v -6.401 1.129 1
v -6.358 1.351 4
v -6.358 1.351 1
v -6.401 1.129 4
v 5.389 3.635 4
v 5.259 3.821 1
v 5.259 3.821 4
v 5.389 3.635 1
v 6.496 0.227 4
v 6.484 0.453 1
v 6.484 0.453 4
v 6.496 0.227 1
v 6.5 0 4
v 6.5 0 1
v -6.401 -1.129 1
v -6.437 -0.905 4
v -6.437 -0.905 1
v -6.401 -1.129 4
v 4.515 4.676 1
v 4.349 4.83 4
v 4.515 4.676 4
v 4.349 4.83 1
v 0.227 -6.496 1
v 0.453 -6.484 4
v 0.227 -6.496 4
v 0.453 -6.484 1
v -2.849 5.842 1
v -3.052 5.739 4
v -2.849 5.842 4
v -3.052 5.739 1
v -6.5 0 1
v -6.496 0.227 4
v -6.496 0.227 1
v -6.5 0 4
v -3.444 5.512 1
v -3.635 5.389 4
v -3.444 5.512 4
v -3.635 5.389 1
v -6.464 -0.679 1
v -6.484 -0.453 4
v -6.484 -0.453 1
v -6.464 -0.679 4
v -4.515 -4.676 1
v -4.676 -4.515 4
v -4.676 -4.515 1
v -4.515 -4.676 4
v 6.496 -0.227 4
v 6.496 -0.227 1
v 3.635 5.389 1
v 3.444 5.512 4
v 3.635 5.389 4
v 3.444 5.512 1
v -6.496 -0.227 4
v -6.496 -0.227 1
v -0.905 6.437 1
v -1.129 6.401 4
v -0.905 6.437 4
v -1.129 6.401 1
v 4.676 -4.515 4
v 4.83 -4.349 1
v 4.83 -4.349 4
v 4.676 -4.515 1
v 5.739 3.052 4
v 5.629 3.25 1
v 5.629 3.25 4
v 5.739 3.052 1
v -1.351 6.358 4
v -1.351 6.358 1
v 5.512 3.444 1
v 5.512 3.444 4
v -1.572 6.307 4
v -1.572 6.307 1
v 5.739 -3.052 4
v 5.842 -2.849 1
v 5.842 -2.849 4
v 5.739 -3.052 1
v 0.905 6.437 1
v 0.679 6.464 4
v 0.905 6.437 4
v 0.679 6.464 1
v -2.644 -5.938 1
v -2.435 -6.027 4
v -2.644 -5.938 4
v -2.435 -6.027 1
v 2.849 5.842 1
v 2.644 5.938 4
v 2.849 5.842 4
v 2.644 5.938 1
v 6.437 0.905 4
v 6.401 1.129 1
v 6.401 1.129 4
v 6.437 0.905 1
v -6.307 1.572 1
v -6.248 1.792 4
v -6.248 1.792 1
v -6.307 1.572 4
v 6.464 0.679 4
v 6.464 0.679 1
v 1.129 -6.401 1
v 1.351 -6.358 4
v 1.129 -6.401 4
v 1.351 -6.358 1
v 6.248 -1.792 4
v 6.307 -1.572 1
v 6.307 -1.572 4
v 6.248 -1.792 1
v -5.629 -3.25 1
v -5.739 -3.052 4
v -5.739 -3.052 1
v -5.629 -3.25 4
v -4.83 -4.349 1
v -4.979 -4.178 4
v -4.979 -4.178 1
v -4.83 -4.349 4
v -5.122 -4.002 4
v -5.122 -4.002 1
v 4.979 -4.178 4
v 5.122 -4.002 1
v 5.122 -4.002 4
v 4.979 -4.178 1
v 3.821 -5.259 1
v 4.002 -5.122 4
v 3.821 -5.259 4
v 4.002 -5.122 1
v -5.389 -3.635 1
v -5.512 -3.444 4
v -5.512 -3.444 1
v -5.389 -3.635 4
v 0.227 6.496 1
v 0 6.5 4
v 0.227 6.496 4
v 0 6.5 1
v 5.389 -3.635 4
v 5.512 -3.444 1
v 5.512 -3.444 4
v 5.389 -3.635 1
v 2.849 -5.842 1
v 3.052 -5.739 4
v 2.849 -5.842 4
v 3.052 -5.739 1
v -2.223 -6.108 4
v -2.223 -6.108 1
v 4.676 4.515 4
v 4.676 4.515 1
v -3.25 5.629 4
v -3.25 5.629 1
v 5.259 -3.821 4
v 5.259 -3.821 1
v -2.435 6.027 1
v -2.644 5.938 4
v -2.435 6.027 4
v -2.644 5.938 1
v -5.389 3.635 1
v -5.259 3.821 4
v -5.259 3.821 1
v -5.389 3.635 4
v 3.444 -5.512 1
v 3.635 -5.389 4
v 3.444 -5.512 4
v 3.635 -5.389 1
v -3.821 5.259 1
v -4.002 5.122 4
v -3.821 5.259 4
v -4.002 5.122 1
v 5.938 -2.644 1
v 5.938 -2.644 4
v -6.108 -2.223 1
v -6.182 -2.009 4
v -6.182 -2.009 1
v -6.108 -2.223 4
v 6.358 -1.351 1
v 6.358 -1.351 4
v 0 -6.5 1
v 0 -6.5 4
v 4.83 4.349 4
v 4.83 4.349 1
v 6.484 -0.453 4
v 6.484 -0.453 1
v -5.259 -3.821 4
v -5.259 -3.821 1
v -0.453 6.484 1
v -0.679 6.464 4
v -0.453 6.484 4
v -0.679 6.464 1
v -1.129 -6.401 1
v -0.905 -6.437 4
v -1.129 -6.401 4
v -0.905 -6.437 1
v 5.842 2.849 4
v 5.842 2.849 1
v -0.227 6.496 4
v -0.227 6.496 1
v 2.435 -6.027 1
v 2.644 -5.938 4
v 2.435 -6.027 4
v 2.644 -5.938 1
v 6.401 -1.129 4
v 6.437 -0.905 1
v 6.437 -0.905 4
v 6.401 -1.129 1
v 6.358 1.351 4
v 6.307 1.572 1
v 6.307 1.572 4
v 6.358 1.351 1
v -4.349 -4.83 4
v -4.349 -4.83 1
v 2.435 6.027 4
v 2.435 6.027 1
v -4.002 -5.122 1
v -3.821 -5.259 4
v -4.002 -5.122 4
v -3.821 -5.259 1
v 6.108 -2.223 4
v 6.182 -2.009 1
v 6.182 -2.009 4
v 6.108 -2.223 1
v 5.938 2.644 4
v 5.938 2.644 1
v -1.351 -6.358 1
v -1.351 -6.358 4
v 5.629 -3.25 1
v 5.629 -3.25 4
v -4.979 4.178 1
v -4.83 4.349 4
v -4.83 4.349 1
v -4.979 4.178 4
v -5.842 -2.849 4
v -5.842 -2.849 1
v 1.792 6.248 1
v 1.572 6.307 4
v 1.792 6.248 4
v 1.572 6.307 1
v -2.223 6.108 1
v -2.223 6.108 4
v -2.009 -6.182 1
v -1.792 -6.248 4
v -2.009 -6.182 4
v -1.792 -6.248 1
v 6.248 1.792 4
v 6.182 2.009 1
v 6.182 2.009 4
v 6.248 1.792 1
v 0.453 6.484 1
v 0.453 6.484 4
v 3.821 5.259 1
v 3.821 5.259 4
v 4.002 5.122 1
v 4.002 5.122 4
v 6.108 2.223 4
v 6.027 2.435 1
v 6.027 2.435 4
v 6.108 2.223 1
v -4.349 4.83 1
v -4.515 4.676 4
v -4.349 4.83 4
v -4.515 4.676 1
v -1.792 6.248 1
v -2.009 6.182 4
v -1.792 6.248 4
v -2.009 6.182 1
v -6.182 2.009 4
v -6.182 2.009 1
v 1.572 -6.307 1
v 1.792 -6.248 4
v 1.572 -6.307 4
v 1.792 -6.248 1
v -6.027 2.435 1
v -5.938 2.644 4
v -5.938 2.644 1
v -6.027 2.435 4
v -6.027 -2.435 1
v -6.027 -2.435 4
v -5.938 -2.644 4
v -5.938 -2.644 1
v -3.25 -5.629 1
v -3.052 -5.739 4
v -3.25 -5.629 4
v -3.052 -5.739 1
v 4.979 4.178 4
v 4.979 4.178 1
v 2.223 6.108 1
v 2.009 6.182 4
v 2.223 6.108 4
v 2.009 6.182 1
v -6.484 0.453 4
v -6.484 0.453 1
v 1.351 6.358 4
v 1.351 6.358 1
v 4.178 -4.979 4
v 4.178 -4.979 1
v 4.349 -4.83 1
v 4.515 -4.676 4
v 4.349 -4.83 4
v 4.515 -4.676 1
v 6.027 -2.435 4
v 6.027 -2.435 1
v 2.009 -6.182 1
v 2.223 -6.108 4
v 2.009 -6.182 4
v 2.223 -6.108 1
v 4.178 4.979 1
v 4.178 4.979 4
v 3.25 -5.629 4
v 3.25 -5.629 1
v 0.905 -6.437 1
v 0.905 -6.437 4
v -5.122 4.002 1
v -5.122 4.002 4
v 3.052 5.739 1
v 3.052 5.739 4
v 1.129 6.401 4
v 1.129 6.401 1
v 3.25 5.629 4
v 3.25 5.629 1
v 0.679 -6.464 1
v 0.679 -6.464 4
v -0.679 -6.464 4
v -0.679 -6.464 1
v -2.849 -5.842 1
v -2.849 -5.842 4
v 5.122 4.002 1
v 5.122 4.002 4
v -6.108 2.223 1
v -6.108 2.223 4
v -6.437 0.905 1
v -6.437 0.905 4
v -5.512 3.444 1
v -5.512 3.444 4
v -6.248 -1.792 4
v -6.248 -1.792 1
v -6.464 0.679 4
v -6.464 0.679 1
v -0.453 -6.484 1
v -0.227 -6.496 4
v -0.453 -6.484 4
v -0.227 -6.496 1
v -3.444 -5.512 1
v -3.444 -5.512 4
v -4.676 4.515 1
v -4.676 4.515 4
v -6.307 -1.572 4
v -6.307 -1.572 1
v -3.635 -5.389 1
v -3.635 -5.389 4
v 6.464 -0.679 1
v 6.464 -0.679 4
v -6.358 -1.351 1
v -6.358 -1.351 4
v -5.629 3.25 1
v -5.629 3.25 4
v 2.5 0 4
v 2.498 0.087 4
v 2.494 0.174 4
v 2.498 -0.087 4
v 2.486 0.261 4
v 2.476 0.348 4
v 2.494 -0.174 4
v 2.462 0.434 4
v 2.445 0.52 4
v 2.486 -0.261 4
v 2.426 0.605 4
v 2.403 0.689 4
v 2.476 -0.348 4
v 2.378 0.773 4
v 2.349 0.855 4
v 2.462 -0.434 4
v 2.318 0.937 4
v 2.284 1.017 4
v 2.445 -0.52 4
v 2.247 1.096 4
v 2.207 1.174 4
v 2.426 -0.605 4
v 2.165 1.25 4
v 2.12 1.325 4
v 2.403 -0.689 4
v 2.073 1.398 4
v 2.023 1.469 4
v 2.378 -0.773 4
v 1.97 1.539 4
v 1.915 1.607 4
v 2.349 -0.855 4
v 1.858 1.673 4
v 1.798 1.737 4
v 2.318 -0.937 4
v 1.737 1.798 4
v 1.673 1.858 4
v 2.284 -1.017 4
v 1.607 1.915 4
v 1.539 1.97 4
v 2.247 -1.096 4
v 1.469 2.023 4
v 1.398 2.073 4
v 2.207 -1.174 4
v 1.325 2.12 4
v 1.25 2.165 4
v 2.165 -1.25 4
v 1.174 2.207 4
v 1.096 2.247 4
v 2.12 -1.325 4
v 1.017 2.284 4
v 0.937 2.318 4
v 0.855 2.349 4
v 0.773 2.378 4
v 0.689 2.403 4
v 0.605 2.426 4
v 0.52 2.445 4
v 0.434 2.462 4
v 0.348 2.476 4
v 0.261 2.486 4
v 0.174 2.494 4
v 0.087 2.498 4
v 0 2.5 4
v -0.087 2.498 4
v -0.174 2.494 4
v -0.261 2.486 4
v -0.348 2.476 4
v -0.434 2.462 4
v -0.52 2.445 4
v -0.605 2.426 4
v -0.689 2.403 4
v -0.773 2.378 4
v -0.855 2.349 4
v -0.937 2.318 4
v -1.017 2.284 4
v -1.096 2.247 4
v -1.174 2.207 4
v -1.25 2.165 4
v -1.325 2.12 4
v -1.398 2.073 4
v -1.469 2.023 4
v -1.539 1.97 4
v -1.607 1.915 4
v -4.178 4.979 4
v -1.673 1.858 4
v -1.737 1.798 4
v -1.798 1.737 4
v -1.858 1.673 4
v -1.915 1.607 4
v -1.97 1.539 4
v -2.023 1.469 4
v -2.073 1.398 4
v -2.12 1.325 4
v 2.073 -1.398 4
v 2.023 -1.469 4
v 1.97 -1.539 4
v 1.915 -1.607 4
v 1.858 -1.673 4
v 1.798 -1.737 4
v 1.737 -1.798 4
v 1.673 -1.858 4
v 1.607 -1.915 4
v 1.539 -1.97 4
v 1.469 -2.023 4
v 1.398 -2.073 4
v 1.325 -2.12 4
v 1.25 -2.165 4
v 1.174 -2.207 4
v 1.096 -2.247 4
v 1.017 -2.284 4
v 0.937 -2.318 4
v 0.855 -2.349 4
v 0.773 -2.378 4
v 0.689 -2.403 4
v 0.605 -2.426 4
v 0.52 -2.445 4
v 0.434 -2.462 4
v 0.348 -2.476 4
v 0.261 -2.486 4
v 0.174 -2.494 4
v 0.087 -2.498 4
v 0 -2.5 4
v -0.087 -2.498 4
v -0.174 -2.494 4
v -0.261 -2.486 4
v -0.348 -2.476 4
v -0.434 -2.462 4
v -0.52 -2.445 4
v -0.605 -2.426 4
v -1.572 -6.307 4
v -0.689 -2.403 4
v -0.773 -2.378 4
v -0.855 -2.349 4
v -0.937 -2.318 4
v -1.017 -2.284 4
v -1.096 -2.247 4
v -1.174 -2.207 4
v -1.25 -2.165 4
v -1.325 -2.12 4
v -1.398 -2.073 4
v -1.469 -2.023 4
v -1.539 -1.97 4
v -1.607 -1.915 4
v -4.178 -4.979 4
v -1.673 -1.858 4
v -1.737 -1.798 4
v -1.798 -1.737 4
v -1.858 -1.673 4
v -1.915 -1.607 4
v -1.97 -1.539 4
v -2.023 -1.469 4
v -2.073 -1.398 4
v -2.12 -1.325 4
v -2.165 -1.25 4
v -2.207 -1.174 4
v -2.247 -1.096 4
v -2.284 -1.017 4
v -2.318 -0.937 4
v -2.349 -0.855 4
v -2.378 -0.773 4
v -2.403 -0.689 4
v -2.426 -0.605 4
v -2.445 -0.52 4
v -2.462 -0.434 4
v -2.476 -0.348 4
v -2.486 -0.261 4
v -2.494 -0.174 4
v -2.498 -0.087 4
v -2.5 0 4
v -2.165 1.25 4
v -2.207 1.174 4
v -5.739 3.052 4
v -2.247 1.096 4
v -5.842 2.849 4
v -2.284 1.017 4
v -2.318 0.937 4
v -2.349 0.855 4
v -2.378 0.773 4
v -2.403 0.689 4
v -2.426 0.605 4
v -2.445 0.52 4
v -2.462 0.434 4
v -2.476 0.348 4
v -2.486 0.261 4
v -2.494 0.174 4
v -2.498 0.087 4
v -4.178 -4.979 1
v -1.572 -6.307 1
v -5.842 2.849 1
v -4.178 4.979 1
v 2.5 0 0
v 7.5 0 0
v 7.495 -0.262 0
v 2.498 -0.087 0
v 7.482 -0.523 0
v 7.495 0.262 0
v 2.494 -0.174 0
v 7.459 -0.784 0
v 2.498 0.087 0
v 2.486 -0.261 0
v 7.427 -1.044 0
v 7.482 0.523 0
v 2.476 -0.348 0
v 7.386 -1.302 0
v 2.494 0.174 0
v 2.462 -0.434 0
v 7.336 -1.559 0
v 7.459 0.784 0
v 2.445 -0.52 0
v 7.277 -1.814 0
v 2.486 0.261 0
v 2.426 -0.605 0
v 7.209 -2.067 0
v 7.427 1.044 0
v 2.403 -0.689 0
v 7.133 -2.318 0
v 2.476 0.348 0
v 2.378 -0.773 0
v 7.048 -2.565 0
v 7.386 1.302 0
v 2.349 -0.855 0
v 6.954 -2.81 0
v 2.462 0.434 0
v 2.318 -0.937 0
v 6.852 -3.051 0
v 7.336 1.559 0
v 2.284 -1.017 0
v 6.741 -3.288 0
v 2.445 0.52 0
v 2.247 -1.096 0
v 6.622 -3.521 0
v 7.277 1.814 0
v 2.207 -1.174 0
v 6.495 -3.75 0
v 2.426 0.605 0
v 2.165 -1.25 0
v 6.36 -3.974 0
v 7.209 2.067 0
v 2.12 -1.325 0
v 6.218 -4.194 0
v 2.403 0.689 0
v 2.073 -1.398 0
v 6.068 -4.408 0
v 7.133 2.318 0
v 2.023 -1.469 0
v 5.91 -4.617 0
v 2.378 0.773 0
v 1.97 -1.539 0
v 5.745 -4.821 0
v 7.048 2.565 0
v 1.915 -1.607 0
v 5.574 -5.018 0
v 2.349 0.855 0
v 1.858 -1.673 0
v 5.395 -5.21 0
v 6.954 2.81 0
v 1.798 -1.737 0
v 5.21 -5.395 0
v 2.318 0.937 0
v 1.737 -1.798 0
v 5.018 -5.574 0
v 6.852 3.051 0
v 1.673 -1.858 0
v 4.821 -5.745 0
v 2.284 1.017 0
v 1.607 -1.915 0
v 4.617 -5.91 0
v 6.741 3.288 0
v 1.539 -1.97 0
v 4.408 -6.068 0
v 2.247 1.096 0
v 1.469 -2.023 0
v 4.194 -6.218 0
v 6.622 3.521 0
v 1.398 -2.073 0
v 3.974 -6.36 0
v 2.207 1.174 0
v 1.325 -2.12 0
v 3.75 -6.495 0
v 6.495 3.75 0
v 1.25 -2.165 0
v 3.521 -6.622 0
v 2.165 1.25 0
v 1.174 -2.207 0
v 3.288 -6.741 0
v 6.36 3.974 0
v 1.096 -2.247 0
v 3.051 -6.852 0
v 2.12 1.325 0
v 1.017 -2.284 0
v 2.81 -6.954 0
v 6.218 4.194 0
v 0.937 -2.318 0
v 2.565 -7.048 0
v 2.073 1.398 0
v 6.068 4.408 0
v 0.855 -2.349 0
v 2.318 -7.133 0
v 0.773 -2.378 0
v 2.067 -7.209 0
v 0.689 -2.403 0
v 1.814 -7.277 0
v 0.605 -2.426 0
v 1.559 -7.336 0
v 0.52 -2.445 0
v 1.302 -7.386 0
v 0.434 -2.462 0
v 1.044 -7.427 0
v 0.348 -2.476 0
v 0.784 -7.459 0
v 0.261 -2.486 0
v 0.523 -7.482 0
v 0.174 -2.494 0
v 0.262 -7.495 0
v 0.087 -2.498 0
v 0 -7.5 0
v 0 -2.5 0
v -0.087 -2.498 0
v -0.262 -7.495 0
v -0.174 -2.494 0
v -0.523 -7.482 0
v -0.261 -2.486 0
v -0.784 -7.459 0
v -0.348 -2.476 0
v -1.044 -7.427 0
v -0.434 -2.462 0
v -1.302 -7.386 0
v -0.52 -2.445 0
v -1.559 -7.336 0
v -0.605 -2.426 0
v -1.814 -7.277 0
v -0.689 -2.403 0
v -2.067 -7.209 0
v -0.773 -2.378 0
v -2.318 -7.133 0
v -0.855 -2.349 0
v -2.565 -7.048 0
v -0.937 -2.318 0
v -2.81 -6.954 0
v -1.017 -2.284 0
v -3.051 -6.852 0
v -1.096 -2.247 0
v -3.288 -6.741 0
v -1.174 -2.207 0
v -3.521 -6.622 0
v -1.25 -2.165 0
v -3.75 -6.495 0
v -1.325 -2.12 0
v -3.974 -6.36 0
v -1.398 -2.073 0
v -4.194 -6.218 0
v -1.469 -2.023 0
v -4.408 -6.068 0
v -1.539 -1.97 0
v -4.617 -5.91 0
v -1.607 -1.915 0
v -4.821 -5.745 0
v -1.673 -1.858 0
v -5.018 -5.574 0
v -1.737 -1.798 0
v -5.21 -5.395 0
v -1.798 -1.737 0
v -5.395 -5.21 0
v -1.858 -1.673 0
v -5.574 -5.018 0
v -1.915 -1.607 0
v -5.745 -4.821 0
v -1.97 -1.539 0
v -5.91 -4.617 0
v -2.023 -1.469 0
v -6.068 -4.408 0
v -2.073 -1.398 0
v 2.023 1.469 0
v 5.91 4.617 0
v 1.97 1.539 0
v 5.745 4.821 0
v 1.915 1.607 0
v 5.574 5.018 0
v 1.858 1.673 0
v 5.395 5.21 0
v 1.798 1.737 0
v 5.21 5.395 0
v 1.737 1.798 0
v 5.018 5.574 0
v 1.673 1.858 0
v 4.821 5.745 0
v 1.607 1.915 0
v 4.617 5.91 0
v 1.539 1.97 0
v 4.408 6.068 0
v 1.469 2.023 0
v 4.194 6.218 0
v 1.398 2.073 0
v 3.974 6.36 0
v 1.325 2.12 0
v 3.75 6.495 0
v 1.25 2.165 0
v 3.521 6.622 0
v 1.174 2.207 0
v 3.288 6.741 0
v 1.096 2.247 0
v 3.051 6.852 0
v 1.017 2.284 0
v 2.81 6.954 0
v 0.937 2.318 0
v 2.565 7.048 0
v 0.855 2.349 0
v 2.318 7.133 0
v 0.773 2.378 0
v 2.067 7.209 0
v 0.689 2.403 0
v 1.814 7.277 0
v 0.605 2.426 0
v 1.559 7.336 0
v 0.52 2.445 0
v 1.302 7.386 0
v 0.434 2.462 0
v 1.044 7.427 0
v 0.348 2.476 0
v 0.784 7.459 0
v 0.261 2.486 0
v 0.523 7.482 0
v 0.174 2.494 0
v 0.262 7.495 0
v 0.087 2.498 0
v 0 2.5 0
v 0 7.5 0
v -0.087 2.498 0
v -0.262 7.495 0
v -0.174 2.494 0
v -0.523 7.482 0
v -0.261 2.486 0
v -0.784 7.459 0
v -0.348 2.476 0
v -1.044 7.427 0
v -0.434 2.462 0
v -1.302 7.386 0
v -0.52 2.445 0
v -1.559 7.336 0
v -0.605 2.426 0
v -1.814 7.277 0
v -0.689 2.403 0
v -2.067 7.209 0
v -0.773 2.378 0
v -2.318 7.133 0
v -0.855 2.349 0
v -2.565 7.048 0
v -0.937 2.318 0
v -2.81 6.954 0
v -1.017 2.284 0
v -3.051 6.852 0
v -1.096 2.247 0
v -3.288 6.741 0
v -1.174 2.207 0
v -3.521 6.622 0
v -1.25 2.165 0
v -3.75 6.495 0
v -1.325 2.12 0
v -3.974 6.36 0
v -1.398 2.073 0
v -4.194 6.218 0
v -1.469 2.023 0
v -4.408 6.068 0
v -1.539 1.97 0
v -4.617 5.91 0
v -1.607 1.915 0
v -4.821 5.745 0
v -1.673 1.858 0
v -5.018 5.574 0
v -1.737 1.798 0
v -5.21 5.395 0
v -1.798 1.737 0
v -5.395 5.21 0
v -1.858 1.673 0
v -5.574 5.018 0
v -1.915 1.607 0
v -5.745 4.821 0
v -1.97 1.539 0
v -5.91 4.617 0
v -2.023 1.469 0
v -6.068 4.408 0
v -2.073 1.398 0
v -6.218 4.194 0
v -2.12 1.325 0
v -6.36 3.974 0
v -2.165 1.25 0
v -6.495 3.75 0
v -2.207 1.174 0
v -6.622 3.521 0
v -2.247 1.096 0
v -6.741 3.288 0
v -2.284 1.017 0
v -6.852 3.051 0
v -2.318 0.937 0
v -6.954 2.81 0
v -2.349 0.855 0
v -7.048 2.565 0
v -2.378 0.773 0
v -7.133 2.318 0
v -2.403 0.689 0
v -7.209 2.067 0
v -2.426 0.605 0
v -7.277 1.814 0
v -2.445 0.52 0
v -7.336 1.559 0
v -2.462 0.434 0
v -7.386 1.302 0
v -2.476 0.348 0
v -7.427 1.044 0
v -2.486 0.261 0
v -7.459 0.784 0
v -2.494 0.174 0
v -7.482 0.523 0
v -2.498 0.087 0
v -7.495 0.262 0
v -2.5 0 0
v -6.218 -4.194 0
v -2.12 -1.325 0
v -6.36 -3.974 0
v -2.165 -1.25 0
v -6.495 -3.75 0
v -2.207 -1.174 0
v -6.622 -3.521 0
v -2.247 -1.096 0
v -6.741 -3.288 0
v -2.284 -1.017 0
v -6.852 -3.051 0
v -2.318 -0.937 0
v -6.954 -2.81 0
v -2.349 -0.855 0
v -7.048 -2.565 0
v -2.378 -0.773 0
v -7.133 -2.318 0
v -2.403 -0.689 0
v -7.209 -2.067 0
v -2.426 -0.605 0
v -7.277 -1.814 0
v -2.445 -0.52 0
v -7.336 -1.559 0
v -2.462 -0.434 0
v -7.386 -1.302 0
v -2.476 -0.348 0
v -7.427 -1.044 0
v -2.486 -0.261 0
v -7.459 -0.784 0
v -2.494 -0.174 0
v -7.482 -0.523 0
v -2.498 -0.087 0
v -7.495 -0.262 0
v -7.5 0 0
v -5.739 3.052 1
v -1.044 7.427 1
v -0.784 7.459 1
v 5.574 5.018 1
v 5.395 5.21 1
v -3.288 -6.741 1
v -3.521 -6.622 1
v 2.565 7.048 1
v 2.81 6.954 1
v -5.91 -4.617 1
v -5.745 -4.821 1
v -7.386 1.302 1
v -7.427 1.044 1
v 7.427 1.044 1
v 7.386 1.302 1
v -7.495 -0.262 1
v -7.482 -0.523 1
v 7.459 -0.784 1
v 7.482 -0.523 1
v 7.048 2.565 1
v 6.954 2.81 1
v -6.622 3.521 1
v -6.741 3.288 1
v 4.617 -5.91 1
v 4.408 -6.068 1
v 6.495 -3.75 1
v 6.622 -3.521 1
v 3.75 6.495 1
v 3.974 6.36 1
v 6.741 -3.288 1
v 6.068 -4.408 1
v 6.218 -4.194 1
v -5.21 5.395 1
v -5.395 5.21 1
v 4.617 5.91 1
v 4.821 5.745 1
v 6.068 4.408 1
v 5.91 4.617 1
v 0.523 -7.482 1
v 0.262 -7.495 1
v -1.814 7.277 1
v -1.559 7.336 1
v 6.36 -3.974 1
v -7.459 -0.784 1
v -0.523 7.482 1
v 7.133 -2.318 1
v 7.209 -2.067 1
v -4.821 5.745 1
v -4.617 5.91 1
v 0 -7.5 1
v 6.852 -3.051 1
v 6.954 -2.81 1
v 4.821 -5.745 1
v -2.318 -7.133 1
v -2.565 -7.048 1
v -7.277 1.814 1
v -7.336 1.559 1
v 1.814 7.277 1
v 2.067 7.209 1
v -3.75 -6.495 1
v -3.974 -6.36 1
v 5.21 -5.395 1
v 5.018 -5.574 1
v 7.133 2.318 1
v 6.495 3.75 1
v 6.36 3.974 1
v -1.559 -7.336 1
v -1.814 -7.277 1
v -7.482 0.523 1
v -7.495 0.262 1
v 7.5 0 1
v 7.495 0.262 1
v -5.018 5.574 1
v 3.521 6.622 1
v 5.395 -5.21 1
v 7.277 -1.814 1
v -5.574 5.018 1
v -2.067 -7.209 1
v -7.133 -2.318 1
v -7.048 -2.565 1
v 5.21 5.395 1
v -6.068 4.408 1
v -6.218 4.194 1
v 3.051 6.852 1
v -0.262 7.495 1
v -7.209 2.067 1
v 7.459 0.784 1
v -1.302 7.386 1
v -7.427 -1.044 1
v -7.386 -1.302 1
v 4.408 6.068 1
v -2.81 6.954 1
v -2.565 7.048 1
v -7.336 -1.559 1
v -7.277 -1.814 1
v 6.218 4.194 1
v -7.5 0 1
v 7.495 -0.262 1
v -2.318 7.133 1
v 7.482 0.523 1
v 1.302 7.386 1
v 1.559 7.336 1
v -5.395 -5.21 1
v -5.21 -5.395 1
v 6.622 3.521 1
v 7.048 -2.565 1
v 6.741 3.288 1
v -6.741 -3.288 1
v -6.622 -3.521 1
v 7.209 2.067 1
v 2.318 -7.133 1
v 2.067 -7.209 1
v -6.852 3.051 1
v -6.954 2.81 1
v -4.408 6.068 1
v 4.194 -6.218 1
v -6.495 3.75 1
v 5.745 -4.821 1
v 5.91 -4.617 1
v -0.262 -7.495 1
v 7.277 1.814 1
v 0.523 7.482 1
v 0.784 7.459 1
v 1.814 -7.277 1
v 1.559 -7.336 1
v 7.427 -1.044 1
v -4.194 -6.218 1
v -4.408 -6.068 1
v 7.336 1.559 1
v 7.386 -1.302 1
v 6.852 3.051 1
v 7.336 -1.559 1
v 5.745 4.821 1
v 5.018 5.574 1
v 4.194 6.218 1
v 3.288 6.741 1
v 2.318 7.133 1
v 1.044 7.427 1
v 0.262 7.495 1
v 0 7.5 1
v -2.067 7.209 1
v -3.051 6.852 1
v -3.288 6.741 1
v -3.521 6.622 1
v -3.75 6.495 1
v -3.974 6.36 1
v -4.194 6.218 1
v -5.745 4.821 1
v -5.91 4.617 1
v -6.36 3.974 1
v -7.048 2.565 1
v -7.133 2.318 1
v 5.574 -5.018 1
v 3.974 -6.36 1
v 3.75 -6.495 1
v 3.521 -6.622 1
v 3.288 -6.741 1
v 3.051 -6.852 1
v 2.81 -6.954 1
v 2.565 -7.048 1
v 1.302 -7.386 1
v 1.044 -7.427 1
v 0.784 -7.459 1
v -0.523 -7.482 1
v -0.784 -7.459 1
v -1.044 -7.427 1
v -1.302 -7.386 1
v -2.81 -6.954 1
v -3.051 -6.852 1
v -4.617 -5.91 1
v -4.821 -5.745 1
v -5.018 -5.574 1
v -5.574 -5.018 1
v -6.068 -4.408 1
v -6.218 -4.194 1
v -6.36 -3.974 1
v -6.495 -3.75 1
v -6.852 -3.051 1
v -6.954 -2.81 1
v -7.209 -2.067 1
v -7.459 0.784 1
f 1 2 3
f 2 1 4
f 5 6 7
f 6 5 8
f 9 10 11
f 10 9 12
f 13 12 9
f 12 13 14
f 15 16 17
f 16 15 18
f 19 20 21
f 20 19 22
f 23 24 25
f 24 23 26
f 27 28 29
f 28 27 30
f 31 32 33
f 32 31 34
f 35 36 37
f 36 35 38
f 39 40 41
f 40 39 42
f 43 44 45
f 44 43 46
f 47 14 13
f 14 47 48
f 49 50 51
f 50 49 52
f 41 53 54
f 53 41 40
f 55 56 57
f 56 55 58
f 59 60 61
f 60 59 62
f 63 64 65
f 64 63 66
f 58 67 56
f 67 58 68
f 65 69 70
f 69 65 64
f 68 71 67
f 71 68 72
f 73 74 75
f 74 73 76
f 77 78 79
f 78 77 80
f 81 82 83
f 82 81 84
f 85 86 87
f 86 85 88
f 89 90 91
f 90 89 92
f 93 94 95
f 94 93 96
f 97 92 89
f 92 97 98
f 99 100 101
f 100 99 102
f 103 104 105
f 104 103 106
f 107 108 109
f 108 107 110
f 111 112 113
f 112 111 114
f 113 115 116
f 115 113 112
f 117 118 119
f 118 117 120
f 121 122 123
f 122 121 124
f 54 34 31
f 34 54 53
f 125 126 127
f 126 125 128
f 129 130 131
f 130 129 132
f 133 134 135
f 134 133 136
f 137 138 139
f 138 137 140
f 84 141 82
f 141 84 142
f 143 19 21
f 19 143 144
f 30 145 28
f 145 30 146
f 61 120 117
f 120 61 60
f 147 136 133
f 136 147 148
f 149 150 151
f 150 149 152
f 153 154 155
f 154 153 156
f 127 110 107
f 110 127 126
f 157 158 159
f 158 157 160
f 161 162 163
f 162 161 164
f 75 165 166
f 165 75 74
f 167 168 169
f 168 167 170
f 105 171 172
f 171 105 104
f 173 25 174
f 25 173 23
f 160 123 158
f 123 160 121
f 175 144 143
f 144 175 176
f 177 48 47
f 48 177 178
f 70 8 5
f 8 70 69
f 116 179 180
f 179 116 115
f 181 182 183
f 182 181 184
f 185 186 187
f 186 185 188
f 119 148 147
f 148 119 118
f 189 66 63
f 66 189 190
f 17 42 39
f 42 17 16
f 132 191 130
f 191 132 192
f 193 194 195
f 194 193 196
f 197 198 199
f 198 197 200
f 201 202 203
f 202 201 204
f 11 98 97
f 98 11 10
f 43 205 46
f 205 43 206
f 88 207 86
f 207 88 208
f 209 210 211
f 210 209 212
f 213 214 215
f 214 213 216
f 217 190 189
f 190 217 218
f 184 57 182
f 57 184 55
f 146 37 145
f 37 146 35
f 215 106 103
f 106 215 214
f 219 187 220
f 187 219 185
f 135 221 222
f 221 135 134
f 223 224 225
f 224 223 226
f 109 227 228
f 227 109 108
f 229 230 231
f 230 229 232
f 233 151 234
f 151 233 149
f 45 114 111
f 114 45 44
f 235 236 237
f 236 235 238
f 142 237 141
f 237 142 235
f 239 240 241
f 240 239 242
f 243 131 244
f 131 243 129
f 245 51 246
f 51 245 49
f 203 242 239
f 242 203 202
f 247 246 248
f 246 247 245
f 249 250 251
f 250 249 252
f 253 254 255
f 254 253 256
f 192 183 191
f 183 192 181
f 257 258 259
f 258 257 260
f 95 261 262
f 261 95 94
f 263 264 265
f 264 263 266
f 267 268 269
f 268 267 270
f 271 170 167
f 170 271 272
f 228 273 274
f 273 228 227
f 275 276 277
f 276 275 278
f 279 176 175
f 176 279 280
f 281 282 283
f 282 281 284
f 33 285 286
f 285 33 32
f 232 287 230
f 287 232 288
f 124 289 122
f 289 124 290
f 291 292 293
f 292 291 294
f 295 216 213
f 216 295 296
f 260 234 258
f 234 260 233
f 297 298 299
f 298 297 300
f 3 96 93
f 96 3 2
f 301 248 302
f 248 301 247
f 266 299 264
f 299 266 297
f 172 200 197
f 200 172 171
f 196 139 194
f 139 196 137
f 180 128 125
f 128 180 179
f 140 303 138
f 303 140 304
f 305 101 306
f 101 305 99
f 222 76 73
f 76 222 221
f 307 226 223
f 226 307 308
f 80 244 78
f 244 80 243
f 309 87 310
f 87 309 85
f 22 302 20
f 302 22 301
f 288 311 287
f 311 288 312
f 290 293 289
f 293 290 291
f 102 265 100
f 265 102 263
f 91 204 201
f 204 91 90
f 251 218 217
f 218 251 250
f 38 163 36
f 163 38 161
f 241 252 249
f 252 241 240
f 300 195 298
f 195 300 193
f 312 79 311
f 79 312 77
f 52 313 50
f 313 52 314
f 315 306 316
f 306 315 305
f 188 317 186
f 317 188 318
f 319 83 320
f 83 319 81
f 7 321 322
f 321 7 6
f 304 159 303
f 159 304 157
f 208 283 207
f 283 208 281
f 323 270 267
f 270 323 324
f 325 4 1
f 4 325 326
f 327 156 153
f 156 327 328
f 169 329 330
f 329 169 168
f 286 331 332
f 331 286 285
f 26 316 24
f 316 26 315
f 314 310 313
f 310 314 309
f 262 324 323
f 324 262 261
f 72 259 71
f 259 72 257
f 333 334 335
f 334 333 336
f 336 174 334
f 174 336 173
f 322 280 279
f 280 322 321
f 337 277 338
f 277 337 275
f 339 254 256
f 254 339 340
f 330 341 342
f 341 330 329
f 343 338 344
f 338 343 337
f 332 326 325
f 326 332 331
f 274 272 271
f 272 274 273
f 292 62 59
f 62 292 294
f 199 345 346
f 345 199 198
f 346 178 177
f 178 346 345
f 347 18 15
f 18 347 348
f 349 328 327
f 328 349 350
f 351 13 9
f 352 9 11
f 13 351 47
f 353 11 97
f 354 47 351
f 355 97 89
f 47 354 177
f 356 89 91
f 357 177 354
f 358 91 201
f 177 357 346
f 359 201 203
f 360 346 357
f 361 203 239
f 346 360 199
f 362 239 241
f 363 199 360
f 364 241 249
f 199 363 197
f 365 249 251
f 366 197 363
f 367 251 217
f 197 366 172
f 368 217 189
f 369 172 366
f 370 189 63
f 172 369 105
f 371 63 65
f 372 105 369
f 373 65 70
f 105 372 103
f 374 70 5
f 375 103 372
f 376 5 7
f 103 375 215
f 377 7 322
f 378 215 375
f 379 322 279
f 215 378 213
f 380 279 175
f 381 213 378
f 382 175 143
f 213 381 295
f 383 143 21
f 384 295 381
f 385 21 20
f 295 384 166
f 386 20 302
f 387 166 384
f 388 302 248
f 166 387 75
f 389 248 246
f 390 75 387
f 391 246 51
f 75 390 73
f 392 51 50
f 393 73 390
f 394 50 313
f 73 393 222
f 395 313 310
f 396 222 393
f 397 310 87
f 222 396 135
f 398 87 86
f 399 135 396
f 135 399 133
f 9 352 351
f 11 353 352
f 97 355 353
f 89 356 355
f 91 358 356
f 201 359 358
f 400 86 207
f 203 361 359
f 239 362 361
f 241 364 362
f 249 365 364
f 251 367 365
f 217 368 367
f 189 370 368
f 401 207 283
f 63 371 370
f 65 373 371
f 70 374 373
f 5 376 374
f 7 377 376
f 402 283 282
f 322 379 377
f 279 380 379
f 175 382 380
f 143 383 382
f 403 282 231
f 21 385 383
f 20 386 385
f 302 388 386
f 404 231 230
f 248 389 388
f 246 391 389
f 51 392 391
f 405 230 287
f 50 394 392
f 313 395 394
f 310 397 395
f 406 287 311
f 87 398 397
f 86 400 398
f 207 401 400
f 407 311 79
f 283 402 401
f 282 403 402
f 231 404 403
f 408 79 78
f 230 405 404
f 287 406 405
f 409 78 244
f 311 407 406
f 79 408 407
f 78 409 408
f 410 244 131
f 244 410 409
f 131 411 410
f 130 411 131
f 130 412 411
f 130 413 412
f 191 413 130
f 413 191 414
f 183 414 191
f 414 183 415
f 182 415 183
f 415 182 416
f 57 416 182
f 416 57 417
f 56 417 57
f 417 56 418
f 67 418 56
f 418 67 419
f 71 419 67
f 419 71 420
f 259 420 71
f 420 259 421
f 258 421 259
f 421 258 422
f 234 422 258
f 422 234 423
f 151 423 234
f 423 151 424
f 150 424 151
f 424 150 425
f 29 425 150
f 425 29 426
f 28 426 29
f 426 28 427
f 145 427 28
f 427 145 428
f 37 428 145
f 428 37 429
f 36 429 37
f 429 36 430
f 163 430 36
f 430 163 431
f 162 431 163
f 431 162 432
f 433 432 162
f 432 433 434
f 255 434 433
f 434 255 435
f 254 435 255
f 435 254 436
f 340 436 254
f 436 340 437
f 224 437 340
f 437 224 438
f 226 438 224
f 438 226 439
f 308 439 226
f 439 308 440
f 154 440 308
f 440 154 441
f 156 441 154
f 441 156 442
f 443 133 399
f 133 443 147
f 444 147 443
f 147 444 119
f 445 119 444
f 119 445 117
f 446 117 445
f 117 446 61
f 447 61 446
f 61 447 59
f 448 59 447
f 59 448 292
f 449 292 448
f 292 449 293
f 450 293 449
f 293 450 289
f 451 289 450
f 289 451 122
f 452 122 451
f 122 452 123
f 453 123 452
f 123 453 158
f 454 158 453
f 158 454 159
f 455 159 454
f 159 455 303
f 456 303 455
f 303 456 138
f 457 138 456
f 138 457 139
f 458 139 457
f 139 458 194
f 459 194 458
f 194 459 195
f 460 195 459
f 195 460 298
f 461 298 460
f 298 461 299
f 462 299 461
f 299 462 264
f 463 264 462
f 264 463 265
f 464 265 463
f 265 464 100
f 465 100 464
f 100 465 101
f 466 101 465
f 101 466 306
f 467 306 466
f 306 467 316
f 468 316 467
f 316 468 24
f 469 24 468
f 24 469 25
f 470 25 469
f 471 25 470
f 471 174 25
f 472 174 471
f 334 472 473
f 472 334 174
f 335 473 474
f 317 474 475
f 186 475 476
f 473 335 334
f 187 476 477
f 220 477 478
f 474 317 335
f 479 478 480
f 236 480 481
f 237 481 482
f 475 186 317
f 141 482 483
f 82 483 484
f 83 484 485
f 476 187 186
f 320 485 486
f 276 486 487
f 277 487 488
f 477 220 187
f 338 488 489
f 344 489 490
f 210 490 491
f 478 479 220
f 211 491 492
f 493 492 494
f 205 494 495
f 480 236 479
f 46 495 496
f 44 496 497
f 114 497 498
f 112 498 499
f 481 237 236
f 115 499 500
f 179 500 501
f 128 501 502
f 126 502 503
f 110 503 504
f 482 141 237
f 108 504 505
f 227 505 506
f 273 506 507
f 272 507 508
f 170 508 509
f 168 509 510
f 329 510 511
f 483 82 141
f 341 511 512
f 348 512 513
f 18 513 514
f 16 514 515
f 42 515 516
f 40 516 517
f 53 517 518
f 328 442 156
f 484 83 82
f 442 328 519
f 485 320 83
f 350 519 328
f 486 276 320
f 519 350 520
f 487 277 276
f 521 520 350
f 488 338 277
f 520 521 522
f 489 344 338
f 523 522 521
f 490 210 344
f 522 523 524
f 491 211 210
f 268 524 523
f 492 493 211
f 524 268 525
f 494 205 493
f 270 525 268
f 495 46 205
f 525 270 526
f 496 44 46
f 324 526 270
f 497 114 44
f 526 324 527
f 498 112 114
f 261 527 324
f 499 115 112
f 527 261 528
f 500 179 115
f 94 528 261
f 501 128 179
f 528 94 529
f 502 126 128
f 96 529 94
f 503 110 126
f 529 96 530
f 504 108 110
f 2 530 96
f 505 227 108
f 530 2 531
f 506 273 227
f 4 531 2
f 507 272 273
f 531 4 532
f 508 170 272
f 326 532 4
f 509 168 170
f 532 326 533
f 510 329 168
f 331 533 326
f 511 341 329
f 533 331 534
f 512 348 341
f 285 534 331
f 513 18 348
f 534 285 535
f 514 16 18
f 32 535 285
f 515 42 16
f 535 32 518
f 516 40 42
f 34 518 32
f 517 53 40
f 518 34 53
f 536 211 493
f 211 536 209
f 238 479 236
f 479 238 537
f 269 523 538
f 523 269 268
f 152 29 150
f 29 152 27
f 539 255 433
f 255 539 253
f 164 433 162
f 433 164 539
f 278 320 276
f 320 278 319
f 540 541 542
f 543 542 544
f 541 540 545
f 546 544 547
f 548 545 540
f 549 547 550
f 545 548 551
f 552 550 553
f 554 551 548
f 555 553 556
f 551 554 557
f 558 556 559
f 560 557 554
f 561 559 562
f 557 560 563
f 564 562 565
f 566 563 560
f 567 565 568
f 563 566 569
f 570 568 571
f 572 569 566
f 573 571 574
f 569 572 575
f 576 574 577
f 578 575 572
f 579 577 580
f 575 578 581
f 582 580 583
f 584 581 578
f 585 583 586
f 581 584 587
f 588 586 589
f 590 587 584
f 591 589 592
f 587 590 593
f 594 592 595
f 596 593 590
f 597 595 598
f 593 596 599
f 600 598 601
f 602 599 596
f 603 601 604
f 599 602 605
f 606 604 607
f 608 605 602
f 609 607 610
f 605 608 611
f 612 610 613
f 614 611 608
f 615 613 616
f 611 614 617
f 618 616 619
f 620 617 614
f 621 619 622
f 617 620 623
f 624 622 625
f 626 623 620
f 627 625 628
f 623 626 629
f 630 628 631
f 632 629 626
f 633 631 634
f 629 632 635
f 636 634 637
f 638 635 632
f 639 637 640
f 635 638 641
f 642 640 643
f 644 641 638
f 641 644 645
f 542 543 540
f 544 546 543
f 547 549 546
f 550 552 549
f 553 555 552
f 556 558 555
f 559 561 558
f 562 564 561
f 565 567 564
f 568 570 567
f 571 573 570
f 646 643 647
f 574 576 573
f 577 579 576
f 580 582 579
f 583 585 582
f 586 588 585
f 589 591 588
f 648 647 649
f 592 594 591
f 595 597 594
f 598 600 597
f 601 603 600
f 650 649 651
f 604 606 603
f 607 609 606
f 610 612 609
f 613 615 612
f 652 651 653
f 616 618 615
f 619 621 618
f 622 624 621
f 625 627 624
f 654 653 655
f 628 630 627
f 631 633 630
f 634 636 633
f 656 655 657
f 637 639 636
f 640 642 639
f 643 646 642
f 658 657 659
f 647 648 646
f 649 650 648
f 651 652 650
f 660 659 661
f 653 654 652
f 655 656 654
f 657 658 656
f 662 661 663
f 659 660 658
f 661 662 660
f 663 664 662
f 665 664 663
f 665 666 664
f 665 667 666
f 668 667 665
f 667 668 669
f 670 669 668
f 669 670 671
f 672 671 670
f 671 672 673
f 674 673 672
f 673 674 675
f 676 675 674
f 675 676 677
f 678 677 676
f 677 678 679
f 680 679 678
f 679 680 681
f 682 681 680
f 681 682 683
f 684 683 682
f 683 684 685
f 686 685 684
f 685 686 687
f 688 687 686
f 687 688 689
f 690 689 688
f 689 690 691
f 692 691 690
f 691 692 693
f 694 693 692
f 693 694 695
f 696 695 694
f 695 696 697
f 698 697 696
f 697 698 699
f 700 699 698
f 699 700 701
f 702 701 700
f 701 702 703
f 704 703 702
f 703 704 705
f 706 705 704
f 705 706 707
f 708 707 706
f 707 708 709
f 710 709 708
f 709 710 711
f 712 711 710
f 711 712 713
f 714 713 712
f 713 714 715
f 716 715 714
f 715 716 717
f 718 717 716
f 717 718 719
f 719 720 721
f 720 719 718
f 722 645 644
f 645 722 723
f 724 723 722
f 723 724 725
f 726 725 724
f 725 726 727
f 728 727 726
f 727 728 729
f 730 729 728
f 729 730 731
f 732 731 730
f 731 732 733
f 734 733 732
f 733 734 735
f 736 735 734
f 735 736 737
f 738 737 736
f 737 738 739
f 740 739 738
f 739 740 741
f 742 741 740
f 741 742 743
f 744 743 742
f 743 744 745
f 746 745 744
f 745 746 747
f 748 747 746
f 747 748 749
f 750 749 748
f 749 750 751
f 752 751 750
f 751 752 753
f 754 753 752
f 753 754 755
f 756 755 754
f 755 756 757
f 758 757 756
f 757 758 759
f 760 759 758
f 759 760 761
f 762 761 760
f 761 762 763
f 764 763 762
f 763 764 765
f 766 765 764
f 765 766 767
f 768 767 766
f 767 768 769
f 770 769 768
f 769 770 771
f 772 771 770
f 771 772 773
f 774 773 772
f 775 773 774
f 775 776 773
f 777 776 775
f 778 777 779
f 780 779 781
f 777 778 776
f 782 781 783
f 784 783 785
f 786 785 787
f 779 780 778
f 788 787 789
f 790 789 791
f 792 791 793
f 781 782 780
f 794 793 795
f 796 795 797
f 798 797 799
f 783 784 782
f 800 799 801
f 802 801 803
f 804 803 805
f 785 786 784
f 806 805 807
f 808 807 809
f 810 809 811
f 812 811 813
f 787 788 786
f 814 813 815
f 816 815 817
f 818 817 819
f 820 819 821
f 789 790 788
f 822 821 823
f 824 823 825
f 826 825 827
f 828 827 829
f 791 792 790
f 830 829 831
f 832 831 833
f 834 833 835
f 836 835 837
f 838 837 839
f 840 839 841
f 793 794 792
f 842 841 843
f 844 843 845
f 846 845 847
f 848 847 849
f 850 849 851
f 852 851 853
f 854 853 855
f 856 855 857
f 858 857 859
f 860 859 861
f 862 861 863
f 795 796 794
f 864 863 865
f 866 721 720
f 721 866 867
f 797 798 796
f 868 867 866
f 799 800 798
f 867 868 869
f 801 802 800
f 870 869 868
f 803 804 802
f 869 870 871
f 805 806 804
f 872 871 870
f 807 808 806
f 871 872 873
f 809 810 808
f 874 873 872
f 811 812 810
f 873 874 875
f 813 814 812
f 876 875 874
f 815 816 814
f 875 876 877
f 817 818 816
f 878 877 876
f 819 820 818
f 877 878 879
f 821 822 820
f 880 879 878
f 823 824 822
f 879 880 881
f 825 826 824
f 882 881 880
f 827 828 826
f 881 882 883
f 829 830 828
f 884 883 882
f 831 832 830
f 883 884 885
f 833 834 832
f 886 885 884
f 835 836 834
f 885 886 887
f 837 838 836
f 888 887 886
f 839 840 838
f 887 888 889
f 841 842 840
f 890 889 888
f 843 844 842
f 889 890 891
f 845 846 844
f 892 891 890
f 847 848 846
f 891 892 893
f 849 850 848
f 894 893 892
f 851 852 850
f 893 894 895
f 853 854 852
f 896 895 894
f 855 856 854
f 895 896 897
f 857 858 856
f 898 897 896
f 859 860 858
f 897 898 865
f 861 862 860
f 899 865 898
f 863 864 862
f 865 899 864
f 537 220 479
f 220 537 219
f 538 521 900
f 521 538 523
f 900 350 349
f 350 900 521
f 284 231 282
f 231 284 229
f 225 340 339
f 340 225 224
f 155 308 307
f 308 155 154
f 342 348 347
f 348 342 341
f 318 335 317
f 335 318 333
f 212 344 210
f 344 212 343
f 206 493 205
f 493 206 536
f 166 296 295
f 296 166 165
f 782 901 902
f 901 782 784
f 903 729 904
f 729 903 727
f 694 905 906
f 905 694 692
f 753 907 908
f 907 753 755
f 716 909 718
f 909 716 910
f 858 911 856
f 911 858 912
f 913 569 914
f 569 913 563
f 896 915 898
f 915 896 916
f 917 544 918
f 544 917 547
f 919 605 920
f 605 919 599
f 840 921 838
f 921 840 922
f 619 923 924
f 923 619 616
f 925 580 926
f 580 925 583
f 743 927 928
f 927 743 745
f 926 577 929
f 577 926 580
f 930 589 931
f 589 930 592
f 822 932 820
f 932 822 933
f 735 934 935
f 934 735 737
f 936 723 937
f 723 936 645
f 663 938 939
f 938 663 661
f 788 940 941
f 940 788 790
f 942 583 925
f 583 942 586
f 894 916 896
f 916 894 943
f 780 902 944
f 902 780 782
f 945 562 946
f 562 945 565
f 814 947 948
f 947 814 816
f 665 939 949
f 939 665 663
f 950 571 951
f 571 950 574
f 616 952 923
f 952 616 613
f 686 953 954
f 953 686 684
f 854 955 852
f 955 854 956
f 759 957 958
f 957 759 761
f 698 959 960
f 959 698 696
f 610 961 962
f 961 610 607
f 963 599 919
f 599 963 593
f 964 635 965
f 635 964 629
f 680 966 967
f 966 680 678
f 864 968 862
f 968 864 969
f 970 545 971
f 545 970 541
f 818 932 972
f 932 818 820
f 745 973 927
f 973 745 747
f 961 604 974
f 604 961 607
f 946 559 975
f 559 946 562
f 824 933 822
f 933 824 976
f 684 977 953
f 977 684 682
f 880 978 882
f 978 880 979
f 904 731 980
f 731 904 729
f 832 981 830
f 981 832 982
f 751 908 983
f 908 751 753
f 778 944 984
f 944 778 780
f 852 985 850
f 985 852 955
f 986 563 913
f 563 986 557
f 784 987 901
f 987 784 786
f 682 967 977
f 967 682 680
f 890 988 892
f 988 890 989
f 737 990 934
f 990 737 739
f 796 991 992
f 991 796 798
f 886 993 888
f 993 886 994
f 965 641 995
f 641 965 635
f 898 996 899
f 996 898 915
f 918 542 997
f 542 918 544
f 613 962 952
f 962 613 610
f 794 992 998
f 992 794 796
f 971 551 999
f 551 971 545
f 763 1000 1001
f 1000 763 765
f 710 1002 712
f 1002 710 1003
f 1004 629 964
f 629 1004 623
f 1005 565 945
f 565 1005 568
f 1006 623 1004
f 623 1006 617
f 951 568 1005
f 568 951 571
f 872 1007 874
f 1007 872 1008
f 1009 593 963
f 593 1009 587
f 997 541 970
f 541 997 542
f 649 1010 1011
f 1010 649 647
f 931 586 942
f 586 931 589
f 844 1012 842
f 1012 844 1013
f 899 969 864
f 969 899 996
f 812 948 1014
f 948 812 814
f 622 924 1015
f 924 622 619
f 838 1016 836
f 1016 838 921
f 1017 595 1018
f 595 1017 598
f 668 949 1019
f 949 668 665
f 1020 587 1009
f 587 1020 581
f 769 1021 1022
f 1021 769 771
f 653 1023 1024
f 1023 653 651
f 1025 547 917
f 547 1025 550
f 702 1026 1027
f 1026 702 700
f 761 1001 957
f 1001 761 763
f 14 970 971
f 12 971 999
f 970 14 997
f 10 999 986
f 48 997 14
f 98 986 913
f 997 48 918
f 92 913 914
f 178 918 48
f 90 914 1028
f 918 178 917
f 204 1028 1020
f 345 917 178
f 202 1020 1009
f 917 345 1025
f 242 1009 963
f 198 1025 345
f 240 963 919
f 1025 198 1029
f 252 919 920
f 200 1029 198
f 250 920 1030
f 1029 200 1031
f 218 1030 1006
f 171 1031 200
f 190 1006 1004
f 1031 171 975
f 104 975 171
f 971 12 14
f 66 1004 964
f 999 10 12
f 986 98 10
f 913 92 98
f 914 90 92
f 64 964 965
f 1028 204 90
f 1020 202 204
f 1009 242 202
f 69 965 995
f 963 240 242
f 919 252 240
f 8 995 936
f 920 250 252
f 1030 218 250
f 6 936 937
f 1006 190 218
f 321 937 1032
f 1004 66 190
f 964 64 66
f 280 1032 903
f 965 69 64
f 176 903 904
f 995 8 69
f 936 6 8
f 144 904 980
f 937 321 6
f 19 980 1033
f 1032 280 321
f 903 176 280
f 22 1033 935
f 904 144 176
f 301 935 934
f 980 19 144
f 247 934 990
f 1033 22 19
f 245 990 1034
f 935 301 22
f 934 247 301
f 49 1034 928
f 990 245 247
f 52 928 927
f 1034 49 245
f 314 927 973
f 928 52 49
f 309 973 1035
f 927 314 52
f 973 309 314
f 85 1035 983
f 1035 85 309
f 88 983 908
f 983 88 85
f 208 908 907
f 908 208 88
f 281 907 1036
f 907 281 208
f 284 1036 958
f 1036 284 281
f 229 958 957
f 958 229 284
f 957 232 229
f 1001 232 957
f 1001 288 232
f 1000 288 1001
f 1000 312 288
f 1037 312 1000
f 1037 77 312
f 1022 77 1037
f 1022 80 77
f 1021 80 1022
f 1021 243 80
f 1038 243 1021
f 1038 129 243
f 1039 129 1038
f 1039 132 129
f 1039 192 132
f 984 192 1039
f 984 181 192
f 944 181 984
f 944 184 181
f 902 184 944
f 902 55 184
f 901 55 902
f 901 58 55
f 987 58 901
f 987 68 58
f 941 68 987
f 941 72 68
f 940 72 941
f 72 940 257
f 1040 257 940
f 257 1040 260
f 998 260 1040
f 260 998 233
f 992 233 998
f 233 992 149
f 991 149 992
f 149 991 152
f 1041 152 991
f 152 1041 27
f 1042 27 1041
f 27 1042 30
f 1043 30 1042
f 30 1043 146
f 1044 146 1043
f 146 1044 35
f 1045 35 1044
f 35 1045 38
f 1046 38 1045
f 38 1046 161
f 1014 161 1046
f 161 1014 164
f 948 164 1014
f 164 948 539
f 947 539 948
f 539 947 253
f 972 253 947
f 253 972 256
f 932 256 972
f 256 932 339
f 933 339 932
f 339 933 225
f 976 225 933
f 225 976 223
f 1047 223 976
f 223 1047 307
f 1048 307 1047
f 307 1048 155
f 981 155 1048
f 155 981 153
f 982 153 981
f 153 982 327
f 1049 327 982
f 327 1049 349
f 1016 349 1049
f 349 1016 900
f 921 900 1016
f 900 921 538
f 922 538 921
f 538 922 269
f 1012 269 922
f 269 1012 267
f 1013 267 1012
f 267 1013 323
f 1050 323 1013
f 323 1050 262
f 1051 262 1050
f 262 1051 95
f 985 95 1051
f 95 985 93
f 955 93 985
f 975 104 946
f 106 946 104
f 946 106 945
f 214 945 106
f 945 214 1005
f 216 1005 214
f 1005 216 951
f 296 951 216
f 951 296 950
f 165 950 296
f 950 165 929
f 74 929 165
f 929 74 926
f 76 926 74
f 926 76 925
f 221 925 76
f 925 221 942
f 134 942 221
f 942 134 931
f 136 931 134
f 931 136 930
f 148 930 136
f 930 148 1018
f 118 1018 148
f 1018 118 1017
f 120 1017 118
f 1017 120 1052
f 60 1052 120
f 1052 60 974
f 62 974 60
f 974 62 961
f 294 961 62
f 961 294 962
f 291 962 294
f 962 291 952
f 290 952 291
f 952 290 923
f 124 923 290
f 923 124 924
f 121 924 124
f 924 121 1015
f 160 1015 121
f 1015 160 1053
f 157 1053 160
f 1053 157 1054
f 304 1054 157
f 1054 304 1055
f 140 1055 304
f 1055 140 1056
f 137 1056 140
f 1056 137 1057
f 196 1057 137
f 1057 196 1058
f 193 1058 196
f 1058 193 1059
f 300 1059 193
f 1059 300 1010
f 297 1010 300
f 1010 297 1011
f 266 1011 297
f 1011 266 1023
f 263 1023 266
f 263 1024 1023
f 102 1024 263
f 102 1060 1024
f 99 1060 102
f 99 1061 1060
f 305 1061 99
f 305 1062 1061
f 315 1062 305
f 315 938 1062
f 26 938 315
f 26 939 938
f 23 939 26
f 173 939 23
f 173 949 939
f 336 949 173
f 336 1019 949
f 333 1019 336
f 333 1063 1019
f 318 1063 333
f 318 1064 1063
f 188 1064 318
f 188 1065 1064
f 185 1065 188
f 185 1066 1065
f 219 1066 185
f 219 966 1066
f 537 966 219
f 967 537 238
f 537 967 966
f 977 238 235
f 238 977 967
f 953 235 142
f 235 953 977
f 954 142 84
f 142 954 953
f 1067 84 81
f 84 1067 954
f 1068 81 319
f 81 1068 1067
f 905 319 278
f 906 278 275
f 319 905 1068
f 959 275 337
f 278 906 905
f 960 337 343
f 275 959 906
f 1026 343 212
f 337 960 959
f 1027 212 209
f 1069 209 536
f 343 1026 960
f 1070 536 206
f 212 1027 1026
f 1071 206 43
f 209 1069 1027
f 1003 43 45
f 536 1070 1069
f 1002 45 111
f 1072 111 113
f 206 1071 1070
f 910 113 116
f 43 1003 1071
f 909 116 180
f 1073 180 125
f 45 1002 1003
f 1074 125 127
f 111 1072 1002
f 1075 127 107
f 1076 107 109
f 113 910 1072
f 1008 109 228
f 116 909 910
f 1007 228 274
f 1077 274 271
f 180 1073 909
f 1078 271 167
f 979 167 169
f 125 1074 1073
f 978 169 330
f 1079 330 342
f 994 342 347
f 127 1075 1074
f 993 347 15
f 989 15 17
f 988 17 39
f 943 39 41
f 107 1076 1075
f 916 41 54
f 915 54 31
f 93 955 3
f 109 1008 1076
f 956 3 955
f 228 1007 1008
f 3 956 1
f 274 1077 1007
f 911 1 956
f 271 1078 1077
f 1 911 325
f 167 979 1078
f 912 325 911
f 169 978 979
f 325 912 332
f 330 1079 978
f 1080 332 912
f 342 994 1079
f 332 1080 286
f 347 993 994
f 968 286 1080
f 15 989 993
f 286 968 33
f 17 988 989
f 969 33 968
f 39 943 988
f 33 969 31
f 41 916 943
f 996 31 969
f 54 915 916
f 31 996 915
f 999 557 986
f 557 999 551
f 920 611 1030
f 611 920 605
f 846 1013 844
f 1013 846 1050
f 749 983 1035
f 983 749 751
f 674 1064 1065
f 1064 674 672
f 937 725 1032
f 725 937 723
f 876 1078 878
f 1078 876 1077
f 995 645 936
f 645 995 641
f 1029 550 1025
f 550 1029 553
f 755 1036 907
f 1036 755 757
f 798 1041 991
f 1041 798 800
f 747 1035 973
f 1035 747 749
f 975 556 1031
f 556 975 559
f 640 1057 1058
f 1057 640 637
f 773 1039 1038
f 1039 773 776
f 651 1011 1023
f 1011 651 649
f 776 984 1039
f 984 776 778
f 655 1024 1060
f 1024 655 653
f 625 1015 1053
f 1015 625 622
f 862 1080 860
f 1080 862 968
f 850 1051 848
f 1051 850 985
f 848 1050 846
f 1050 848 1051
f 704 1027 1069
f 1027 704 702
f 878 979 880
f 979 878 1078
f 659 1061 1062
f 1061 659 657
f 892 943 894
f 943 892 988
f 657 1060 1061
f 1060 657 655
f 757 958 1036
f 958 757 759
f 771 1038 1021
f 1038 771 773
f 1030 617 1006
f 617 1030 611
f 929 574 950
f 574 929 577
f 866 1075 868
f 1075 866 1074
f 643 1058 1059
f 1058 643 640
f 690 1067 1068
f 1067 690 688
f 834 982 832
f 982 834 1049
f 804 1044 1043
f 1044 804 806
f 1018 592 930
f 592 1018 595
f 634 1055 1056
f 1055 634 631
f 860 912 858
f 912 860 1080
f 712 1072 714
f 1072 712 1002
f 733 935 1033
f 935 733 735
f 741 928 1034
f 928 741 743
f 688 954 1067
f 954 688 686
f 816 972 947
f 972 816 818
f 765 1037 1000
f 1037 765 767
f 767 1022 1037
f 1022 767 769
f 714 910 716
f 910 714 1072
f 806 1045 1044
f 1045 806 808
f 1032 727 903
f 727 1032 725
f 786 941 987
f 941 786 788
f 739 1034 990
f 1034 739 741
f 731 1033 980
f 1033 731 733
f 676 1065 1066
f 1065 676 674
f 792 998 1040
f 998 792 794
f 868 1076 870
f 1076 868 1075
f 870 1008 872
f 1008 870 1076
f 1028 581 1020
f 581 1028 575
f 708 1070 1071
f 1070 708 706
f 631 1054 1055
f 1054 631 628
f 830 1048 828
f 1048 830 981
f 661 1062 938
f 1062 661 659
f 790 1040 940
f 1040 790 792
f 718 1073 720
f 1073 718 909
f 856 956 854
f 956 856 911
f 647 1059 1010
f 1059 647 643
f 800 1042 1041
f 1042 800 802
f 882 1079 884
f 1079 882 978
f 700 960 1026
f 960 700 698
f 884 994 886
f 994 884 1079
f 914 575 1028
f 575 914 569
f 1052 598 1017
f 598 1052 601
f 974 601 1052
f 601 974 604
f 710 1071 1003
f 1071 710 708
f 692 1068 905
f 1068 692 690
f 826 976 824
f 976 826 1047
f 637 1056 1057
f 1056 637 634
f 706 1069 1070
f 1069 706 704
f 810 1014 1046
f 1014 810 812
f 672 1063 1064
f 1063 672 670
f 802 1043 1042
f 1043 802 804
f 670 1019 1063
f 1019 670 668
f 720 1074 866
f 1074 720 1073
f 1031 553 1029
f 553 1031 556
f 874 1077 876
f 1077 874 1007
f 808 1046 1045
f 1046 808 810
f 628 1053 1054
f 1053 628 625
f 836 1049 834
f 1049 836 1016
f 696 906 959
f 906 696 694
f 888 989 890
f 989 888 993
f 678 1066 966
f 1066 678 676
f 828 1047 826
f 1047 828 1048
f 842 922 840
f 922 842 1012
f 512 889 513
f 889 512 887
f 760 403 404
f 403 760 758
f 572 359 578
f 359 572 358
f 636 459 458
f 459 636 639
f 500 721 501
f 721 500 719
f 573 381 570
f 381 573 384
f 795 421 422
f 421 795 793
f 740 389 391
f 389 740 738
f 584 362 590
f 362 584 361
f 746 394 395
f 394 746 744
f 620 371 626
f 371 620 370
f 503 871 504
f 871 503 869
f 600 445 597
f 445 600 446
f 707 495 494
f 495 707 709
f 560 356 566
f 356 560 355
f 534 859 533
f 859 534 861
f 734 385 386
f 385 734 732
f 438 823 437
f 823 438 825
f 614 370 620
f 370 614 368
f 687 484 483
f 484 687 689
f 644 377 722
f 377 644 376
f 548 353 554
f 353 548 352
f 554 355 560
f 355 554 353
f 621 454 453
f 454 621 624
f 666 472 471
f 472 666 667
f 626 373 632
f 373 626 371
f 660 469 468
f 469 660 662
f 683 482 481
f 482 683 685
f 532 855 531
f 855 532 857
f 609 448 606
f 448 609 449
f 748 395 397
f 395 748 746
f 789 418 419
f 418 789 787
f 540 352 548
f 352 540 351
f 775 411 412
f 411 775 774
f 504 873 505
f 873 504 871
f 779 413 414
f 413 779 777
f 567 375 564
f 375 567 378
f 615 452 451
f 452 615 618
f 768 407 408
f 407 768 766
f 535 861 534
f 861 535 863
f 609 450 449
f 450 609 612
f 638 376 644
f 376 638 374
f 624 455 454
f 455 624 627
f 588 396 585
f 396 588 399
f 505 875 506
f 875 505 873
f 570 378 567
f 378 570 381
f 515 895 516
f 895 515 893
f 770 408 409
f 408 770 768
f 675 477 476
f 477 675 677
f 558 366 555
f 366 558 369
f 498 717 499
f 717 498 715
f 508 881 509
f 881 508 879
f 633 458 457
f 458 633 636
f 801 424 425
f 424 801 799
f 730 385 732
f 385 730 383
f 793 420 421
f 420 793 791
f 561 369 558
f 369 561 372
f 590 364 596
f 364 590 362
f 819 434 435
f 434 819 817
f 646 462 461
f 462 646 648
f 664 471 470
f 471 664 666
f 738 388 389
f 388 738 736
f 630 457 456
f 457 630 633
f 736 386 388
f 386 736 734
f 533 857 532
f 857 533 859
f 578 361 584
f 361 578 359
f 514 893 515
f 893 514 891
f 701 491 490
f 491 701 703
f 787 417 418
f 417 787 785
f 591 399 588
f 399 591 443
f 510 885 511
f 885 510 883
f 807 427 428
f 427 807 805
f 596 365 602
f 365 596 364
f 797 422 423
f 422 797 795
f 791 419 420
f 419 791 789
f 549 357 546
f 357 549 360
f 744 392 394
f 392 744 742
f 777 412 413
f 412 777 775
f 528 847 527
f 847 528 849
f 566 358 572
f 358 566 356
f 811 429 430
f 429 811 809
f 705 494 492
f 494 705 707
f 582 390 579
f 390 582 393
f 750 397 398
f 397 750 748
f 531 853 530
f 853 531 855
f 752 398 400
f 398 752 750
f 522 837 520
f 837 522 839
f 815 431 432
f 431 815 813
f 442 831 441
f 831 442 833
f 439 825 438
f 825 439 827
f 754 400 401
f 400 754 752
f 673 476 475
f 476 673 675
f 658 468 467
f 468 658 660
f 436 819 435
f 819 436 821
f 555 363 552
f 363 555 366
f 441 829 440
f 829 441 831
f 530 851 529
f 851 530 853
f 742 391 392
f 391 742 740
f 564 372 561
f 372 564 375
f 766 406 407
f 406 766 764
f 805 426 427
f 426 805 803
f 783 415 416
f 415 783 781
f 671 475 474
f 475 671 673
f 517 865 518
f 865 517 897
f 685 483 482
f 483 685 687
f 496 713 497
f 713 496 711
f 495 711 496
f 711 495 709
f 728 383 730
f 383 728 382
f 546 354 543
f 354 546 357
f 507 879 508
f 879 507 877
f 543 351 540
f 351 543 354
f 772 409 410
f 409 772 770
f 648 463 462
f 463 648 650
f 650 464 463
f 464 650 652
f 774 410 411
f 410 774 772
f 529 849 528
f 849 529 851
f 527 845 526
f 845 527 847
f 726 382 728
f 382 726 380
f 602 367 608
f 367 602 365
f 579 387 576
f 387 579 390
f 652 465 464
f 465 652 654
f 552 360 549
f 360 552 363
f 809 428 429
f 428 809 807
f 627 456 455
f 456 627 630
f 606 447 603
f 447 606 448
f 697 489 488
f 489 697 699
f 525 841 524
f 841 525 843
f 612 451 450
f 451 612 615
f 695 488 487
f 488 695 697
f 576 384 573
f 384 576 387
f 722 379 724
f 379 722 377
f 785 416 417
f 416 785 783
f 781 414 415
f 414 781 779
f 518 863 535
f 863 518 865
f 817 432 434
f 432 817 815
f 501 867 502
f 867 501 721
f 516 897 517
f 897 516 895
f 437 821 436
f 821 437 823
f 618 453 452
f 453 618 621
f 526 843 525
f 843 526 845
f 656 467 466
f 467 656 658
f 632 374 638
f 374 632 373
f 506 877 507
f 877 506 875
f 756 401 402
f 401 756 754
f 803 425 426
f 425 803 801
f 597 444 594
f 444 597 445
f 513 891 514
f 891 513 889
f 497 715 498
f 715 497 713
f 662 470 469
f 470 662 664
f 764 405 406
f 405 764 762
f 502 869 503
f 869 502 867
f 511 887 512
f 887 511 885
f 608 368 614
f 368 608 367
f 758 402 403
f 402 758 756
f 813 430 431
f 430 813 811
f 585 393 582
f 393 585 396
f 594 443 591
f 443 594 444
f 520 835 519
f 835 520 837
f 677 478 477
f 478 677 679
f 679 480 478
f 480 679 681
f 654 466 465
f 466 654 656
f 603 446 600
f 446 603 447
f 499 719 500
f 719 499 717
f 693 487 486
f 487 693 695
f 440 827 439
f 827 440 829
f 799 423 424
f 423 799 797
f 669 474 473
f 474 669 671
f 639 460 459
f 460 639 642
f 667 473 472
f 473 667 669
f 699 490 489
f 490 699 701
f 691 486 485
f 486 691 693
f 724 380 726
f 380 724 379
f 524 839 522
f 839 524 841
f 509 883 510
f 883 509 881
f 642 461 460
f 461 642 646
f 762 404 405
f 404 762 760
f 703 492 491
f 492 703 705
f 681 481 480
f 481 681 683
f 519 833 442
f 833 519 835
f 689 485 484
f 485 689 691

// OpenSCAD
$fn = 180;

bore_d = 5.0;
od_d = 13.0;
width = 4.0;

flange_d = 15.0;
flange_th = 1.0;

module flanged_bearing(bore_d, od_d, width, flange_d, flange_th) {
    difference() {
        union() {
            cylinder(d=od_d, h=width);
            cylinder(d=flange_d, h=flange_th);
        }
        translate([0,0,-0.1])
            cylinder(d=bore_d, h=width + 0.2);
    }
}

flanged_bearing(bore_d, od_d, width, flange_d, flange_th);
